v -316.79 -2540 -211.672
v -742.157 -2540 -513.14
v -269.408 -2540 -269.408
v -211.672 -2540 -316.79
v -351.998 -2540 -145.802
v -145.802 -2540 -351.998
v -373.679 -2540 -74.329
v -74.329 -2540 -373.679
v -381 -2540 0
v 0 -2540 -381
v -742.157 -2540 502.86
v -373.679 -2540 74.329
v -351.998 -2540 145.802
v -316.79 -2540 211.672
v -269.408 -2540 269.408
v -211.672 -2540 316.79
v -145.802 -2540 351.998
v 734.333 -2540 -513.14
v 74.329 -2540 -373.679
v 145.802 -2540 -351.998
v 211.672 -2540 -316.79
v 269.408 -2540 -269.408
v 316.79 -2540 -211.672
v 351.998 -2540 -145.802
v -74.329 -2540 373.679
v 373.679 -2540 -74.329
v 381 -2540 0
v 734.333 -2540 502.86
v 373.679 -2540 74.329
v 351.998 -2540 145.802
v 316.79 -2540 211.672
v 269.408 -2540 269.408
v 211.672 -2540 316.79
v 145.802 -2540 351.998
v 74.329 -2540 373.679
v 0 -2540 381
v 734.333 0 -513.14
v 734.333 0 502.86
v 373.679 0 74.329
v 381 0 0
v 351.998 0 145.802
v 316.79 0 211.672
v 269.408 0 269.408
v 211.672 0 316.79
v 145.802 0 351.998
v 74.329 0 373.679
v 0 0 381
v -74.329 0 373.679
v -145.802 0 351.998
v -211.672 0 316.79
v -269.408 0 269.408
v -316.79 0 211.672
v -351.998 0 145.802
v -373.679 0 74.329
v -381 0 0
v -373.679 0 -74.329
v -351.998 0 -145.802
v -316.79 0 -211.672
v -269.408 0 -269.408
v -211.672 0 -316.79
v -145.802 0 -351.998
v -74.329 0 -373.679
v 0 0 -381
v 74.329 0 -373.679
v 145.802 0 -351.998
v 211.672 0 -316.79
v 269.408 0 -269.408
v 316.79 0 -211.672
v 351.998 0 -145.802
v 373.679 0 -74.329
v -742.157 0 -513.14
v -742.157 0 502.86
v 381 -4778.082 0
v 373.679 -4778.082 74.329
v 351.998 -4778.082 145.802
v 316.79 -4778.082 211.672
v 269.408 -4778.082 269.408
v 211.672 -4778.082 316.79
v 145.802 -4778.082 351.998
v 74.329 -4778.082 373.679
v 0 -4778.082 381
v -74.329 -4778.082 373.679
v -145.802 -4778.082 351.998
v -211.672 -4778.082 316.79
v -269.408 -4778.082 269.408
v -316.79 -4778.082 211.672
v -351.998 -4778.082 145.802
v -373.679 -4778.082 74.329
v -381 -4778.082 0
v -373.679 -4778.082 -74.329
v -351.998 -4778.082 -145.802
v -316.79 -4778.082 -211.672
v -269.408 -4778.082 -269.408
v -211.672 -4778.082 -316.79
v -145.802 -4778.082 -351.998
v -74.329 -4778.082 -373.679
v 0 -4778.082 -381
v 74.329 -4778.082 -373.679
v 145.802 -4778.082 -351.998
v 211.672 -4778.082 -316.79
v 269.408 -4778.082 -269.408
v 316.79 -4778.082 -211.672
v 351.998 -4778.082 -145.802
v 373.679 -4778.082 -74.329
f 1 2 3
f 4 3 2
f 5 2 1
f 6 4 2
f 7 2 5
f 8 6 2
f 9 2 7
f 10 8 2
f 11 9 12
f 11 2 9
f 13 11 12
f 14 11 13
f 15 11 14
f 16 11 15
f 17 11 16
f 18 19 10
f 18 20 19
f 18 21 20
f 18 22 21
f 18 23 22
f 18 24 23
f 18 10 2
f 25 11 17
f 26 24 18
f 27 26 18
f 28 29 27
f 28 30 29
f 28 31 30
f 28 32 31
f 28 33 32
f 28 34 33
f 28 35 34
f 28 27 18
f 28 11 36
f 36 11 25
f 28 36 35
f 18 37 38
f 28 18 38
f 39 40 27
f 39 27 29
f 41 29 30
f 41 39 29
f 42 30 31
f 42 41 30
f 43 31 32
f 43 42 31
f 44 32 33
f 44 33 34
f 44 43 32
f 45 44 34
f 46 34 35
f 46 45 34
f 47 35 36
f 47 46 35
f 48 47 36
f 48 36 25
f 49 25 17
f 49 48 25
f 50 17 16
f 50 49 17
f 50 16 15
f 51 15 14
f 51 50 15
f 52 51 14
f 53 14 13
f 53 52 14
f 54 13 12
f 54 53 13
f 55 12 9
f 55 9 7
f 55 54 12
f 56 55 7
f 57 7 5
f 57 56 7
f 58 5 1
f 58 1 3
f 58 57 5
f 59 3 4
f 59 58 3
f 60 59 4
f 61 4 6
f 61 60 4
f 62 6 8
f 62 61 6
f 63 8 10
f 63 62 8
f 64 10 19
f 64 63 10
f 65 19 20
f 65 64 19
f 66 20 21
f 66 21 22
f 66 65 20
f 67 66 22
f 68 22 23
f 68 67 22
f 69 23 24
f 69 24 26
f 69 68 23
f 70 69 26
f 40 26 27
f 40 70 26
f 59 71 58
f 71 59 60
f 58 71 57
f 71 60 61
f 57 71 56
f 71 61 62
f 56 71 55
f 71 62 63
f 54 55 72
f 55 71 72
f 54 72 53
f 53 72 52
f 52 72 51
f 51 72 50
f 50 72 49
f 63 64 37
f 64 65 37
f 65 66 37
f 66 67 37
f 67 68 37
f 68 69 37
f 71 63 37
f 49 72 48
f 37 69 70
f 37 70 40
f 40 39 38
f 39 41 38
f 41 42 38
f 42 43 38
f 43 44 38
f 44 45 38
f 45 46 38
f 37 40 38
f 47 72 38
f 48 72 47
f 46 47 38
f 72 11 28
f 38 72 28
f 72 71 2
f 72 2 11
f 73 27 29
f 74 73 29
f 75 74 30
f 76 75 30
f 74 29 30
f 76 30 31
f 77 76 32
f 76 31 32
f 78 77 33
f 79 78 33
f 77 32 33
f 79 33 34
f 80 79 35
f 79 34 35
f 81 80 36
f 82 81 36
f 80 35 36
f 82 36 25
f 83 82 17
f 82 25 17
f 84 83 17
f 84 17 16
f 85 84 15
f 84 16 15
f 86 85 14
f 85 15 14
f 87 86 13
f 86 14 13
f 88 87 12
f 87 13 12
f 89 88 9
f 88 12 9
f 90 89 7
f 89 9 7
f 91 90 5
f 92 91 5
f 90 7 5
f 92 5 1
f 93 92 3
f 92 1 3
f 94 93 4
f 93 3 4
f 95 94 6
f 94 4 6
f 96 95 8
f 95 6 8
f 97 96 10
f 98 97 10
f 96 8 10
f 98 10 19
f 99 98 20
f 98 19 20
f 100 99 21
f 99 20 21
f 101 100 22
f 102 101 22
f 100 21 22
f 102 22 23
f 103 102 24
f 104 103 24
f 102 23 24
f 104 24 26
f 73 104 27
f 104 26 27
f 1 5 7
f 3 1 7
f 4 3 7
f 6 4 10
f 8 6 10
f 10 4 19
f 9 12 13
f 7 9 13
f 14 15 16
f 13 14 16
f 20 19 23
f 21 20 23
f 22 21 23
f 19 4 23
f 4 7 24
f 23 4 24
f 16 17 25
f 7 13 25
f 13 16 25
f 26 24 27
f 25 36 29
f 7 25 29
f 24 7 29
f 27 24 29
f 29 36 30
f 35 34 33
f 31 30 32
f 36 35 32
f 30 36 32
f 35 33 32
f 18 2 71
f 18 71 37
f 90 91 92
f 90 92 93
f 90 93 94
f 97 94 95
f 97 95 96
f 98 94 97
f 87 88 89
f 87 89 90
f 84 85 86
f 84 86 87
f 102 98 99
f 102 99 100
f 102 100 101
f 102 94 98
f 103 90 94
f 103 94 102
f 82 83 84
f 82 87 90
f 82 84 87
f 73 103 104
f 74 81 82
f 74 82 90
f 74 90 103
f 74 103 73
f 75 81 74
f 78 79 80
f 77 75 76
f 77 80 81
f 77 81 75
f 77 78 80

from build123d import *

# Parameters (mm, degrees)
F0_W     = 1476.490693
F0_H     = 1016
F0_R     = 381
F1_DEPTH = 2540
F2_R     = 381
F3_DEPTH = 2238.081591


with BuildPart() as f1:
    # F0 (on Front) → F1 (new body)
    with BuildSketch(Plane.XZ):
        with Locations((-3.912091, -5.140144)):
            Rectangle(F0_W, F0_H)
        Circle(F0_R, mode=Mode.SUBTRACT)
    extrude(amount=F1_DEPTH)


with BuildPart() as f3:
    # F2 (on face) → F3 (new body)
    with BuildSketch(Plane.XZ.offset(2540)):
        Circle(F2_R)
    extrude(amount=F3_DEPTH)


solid = Compound([f1.part, f3.part])
